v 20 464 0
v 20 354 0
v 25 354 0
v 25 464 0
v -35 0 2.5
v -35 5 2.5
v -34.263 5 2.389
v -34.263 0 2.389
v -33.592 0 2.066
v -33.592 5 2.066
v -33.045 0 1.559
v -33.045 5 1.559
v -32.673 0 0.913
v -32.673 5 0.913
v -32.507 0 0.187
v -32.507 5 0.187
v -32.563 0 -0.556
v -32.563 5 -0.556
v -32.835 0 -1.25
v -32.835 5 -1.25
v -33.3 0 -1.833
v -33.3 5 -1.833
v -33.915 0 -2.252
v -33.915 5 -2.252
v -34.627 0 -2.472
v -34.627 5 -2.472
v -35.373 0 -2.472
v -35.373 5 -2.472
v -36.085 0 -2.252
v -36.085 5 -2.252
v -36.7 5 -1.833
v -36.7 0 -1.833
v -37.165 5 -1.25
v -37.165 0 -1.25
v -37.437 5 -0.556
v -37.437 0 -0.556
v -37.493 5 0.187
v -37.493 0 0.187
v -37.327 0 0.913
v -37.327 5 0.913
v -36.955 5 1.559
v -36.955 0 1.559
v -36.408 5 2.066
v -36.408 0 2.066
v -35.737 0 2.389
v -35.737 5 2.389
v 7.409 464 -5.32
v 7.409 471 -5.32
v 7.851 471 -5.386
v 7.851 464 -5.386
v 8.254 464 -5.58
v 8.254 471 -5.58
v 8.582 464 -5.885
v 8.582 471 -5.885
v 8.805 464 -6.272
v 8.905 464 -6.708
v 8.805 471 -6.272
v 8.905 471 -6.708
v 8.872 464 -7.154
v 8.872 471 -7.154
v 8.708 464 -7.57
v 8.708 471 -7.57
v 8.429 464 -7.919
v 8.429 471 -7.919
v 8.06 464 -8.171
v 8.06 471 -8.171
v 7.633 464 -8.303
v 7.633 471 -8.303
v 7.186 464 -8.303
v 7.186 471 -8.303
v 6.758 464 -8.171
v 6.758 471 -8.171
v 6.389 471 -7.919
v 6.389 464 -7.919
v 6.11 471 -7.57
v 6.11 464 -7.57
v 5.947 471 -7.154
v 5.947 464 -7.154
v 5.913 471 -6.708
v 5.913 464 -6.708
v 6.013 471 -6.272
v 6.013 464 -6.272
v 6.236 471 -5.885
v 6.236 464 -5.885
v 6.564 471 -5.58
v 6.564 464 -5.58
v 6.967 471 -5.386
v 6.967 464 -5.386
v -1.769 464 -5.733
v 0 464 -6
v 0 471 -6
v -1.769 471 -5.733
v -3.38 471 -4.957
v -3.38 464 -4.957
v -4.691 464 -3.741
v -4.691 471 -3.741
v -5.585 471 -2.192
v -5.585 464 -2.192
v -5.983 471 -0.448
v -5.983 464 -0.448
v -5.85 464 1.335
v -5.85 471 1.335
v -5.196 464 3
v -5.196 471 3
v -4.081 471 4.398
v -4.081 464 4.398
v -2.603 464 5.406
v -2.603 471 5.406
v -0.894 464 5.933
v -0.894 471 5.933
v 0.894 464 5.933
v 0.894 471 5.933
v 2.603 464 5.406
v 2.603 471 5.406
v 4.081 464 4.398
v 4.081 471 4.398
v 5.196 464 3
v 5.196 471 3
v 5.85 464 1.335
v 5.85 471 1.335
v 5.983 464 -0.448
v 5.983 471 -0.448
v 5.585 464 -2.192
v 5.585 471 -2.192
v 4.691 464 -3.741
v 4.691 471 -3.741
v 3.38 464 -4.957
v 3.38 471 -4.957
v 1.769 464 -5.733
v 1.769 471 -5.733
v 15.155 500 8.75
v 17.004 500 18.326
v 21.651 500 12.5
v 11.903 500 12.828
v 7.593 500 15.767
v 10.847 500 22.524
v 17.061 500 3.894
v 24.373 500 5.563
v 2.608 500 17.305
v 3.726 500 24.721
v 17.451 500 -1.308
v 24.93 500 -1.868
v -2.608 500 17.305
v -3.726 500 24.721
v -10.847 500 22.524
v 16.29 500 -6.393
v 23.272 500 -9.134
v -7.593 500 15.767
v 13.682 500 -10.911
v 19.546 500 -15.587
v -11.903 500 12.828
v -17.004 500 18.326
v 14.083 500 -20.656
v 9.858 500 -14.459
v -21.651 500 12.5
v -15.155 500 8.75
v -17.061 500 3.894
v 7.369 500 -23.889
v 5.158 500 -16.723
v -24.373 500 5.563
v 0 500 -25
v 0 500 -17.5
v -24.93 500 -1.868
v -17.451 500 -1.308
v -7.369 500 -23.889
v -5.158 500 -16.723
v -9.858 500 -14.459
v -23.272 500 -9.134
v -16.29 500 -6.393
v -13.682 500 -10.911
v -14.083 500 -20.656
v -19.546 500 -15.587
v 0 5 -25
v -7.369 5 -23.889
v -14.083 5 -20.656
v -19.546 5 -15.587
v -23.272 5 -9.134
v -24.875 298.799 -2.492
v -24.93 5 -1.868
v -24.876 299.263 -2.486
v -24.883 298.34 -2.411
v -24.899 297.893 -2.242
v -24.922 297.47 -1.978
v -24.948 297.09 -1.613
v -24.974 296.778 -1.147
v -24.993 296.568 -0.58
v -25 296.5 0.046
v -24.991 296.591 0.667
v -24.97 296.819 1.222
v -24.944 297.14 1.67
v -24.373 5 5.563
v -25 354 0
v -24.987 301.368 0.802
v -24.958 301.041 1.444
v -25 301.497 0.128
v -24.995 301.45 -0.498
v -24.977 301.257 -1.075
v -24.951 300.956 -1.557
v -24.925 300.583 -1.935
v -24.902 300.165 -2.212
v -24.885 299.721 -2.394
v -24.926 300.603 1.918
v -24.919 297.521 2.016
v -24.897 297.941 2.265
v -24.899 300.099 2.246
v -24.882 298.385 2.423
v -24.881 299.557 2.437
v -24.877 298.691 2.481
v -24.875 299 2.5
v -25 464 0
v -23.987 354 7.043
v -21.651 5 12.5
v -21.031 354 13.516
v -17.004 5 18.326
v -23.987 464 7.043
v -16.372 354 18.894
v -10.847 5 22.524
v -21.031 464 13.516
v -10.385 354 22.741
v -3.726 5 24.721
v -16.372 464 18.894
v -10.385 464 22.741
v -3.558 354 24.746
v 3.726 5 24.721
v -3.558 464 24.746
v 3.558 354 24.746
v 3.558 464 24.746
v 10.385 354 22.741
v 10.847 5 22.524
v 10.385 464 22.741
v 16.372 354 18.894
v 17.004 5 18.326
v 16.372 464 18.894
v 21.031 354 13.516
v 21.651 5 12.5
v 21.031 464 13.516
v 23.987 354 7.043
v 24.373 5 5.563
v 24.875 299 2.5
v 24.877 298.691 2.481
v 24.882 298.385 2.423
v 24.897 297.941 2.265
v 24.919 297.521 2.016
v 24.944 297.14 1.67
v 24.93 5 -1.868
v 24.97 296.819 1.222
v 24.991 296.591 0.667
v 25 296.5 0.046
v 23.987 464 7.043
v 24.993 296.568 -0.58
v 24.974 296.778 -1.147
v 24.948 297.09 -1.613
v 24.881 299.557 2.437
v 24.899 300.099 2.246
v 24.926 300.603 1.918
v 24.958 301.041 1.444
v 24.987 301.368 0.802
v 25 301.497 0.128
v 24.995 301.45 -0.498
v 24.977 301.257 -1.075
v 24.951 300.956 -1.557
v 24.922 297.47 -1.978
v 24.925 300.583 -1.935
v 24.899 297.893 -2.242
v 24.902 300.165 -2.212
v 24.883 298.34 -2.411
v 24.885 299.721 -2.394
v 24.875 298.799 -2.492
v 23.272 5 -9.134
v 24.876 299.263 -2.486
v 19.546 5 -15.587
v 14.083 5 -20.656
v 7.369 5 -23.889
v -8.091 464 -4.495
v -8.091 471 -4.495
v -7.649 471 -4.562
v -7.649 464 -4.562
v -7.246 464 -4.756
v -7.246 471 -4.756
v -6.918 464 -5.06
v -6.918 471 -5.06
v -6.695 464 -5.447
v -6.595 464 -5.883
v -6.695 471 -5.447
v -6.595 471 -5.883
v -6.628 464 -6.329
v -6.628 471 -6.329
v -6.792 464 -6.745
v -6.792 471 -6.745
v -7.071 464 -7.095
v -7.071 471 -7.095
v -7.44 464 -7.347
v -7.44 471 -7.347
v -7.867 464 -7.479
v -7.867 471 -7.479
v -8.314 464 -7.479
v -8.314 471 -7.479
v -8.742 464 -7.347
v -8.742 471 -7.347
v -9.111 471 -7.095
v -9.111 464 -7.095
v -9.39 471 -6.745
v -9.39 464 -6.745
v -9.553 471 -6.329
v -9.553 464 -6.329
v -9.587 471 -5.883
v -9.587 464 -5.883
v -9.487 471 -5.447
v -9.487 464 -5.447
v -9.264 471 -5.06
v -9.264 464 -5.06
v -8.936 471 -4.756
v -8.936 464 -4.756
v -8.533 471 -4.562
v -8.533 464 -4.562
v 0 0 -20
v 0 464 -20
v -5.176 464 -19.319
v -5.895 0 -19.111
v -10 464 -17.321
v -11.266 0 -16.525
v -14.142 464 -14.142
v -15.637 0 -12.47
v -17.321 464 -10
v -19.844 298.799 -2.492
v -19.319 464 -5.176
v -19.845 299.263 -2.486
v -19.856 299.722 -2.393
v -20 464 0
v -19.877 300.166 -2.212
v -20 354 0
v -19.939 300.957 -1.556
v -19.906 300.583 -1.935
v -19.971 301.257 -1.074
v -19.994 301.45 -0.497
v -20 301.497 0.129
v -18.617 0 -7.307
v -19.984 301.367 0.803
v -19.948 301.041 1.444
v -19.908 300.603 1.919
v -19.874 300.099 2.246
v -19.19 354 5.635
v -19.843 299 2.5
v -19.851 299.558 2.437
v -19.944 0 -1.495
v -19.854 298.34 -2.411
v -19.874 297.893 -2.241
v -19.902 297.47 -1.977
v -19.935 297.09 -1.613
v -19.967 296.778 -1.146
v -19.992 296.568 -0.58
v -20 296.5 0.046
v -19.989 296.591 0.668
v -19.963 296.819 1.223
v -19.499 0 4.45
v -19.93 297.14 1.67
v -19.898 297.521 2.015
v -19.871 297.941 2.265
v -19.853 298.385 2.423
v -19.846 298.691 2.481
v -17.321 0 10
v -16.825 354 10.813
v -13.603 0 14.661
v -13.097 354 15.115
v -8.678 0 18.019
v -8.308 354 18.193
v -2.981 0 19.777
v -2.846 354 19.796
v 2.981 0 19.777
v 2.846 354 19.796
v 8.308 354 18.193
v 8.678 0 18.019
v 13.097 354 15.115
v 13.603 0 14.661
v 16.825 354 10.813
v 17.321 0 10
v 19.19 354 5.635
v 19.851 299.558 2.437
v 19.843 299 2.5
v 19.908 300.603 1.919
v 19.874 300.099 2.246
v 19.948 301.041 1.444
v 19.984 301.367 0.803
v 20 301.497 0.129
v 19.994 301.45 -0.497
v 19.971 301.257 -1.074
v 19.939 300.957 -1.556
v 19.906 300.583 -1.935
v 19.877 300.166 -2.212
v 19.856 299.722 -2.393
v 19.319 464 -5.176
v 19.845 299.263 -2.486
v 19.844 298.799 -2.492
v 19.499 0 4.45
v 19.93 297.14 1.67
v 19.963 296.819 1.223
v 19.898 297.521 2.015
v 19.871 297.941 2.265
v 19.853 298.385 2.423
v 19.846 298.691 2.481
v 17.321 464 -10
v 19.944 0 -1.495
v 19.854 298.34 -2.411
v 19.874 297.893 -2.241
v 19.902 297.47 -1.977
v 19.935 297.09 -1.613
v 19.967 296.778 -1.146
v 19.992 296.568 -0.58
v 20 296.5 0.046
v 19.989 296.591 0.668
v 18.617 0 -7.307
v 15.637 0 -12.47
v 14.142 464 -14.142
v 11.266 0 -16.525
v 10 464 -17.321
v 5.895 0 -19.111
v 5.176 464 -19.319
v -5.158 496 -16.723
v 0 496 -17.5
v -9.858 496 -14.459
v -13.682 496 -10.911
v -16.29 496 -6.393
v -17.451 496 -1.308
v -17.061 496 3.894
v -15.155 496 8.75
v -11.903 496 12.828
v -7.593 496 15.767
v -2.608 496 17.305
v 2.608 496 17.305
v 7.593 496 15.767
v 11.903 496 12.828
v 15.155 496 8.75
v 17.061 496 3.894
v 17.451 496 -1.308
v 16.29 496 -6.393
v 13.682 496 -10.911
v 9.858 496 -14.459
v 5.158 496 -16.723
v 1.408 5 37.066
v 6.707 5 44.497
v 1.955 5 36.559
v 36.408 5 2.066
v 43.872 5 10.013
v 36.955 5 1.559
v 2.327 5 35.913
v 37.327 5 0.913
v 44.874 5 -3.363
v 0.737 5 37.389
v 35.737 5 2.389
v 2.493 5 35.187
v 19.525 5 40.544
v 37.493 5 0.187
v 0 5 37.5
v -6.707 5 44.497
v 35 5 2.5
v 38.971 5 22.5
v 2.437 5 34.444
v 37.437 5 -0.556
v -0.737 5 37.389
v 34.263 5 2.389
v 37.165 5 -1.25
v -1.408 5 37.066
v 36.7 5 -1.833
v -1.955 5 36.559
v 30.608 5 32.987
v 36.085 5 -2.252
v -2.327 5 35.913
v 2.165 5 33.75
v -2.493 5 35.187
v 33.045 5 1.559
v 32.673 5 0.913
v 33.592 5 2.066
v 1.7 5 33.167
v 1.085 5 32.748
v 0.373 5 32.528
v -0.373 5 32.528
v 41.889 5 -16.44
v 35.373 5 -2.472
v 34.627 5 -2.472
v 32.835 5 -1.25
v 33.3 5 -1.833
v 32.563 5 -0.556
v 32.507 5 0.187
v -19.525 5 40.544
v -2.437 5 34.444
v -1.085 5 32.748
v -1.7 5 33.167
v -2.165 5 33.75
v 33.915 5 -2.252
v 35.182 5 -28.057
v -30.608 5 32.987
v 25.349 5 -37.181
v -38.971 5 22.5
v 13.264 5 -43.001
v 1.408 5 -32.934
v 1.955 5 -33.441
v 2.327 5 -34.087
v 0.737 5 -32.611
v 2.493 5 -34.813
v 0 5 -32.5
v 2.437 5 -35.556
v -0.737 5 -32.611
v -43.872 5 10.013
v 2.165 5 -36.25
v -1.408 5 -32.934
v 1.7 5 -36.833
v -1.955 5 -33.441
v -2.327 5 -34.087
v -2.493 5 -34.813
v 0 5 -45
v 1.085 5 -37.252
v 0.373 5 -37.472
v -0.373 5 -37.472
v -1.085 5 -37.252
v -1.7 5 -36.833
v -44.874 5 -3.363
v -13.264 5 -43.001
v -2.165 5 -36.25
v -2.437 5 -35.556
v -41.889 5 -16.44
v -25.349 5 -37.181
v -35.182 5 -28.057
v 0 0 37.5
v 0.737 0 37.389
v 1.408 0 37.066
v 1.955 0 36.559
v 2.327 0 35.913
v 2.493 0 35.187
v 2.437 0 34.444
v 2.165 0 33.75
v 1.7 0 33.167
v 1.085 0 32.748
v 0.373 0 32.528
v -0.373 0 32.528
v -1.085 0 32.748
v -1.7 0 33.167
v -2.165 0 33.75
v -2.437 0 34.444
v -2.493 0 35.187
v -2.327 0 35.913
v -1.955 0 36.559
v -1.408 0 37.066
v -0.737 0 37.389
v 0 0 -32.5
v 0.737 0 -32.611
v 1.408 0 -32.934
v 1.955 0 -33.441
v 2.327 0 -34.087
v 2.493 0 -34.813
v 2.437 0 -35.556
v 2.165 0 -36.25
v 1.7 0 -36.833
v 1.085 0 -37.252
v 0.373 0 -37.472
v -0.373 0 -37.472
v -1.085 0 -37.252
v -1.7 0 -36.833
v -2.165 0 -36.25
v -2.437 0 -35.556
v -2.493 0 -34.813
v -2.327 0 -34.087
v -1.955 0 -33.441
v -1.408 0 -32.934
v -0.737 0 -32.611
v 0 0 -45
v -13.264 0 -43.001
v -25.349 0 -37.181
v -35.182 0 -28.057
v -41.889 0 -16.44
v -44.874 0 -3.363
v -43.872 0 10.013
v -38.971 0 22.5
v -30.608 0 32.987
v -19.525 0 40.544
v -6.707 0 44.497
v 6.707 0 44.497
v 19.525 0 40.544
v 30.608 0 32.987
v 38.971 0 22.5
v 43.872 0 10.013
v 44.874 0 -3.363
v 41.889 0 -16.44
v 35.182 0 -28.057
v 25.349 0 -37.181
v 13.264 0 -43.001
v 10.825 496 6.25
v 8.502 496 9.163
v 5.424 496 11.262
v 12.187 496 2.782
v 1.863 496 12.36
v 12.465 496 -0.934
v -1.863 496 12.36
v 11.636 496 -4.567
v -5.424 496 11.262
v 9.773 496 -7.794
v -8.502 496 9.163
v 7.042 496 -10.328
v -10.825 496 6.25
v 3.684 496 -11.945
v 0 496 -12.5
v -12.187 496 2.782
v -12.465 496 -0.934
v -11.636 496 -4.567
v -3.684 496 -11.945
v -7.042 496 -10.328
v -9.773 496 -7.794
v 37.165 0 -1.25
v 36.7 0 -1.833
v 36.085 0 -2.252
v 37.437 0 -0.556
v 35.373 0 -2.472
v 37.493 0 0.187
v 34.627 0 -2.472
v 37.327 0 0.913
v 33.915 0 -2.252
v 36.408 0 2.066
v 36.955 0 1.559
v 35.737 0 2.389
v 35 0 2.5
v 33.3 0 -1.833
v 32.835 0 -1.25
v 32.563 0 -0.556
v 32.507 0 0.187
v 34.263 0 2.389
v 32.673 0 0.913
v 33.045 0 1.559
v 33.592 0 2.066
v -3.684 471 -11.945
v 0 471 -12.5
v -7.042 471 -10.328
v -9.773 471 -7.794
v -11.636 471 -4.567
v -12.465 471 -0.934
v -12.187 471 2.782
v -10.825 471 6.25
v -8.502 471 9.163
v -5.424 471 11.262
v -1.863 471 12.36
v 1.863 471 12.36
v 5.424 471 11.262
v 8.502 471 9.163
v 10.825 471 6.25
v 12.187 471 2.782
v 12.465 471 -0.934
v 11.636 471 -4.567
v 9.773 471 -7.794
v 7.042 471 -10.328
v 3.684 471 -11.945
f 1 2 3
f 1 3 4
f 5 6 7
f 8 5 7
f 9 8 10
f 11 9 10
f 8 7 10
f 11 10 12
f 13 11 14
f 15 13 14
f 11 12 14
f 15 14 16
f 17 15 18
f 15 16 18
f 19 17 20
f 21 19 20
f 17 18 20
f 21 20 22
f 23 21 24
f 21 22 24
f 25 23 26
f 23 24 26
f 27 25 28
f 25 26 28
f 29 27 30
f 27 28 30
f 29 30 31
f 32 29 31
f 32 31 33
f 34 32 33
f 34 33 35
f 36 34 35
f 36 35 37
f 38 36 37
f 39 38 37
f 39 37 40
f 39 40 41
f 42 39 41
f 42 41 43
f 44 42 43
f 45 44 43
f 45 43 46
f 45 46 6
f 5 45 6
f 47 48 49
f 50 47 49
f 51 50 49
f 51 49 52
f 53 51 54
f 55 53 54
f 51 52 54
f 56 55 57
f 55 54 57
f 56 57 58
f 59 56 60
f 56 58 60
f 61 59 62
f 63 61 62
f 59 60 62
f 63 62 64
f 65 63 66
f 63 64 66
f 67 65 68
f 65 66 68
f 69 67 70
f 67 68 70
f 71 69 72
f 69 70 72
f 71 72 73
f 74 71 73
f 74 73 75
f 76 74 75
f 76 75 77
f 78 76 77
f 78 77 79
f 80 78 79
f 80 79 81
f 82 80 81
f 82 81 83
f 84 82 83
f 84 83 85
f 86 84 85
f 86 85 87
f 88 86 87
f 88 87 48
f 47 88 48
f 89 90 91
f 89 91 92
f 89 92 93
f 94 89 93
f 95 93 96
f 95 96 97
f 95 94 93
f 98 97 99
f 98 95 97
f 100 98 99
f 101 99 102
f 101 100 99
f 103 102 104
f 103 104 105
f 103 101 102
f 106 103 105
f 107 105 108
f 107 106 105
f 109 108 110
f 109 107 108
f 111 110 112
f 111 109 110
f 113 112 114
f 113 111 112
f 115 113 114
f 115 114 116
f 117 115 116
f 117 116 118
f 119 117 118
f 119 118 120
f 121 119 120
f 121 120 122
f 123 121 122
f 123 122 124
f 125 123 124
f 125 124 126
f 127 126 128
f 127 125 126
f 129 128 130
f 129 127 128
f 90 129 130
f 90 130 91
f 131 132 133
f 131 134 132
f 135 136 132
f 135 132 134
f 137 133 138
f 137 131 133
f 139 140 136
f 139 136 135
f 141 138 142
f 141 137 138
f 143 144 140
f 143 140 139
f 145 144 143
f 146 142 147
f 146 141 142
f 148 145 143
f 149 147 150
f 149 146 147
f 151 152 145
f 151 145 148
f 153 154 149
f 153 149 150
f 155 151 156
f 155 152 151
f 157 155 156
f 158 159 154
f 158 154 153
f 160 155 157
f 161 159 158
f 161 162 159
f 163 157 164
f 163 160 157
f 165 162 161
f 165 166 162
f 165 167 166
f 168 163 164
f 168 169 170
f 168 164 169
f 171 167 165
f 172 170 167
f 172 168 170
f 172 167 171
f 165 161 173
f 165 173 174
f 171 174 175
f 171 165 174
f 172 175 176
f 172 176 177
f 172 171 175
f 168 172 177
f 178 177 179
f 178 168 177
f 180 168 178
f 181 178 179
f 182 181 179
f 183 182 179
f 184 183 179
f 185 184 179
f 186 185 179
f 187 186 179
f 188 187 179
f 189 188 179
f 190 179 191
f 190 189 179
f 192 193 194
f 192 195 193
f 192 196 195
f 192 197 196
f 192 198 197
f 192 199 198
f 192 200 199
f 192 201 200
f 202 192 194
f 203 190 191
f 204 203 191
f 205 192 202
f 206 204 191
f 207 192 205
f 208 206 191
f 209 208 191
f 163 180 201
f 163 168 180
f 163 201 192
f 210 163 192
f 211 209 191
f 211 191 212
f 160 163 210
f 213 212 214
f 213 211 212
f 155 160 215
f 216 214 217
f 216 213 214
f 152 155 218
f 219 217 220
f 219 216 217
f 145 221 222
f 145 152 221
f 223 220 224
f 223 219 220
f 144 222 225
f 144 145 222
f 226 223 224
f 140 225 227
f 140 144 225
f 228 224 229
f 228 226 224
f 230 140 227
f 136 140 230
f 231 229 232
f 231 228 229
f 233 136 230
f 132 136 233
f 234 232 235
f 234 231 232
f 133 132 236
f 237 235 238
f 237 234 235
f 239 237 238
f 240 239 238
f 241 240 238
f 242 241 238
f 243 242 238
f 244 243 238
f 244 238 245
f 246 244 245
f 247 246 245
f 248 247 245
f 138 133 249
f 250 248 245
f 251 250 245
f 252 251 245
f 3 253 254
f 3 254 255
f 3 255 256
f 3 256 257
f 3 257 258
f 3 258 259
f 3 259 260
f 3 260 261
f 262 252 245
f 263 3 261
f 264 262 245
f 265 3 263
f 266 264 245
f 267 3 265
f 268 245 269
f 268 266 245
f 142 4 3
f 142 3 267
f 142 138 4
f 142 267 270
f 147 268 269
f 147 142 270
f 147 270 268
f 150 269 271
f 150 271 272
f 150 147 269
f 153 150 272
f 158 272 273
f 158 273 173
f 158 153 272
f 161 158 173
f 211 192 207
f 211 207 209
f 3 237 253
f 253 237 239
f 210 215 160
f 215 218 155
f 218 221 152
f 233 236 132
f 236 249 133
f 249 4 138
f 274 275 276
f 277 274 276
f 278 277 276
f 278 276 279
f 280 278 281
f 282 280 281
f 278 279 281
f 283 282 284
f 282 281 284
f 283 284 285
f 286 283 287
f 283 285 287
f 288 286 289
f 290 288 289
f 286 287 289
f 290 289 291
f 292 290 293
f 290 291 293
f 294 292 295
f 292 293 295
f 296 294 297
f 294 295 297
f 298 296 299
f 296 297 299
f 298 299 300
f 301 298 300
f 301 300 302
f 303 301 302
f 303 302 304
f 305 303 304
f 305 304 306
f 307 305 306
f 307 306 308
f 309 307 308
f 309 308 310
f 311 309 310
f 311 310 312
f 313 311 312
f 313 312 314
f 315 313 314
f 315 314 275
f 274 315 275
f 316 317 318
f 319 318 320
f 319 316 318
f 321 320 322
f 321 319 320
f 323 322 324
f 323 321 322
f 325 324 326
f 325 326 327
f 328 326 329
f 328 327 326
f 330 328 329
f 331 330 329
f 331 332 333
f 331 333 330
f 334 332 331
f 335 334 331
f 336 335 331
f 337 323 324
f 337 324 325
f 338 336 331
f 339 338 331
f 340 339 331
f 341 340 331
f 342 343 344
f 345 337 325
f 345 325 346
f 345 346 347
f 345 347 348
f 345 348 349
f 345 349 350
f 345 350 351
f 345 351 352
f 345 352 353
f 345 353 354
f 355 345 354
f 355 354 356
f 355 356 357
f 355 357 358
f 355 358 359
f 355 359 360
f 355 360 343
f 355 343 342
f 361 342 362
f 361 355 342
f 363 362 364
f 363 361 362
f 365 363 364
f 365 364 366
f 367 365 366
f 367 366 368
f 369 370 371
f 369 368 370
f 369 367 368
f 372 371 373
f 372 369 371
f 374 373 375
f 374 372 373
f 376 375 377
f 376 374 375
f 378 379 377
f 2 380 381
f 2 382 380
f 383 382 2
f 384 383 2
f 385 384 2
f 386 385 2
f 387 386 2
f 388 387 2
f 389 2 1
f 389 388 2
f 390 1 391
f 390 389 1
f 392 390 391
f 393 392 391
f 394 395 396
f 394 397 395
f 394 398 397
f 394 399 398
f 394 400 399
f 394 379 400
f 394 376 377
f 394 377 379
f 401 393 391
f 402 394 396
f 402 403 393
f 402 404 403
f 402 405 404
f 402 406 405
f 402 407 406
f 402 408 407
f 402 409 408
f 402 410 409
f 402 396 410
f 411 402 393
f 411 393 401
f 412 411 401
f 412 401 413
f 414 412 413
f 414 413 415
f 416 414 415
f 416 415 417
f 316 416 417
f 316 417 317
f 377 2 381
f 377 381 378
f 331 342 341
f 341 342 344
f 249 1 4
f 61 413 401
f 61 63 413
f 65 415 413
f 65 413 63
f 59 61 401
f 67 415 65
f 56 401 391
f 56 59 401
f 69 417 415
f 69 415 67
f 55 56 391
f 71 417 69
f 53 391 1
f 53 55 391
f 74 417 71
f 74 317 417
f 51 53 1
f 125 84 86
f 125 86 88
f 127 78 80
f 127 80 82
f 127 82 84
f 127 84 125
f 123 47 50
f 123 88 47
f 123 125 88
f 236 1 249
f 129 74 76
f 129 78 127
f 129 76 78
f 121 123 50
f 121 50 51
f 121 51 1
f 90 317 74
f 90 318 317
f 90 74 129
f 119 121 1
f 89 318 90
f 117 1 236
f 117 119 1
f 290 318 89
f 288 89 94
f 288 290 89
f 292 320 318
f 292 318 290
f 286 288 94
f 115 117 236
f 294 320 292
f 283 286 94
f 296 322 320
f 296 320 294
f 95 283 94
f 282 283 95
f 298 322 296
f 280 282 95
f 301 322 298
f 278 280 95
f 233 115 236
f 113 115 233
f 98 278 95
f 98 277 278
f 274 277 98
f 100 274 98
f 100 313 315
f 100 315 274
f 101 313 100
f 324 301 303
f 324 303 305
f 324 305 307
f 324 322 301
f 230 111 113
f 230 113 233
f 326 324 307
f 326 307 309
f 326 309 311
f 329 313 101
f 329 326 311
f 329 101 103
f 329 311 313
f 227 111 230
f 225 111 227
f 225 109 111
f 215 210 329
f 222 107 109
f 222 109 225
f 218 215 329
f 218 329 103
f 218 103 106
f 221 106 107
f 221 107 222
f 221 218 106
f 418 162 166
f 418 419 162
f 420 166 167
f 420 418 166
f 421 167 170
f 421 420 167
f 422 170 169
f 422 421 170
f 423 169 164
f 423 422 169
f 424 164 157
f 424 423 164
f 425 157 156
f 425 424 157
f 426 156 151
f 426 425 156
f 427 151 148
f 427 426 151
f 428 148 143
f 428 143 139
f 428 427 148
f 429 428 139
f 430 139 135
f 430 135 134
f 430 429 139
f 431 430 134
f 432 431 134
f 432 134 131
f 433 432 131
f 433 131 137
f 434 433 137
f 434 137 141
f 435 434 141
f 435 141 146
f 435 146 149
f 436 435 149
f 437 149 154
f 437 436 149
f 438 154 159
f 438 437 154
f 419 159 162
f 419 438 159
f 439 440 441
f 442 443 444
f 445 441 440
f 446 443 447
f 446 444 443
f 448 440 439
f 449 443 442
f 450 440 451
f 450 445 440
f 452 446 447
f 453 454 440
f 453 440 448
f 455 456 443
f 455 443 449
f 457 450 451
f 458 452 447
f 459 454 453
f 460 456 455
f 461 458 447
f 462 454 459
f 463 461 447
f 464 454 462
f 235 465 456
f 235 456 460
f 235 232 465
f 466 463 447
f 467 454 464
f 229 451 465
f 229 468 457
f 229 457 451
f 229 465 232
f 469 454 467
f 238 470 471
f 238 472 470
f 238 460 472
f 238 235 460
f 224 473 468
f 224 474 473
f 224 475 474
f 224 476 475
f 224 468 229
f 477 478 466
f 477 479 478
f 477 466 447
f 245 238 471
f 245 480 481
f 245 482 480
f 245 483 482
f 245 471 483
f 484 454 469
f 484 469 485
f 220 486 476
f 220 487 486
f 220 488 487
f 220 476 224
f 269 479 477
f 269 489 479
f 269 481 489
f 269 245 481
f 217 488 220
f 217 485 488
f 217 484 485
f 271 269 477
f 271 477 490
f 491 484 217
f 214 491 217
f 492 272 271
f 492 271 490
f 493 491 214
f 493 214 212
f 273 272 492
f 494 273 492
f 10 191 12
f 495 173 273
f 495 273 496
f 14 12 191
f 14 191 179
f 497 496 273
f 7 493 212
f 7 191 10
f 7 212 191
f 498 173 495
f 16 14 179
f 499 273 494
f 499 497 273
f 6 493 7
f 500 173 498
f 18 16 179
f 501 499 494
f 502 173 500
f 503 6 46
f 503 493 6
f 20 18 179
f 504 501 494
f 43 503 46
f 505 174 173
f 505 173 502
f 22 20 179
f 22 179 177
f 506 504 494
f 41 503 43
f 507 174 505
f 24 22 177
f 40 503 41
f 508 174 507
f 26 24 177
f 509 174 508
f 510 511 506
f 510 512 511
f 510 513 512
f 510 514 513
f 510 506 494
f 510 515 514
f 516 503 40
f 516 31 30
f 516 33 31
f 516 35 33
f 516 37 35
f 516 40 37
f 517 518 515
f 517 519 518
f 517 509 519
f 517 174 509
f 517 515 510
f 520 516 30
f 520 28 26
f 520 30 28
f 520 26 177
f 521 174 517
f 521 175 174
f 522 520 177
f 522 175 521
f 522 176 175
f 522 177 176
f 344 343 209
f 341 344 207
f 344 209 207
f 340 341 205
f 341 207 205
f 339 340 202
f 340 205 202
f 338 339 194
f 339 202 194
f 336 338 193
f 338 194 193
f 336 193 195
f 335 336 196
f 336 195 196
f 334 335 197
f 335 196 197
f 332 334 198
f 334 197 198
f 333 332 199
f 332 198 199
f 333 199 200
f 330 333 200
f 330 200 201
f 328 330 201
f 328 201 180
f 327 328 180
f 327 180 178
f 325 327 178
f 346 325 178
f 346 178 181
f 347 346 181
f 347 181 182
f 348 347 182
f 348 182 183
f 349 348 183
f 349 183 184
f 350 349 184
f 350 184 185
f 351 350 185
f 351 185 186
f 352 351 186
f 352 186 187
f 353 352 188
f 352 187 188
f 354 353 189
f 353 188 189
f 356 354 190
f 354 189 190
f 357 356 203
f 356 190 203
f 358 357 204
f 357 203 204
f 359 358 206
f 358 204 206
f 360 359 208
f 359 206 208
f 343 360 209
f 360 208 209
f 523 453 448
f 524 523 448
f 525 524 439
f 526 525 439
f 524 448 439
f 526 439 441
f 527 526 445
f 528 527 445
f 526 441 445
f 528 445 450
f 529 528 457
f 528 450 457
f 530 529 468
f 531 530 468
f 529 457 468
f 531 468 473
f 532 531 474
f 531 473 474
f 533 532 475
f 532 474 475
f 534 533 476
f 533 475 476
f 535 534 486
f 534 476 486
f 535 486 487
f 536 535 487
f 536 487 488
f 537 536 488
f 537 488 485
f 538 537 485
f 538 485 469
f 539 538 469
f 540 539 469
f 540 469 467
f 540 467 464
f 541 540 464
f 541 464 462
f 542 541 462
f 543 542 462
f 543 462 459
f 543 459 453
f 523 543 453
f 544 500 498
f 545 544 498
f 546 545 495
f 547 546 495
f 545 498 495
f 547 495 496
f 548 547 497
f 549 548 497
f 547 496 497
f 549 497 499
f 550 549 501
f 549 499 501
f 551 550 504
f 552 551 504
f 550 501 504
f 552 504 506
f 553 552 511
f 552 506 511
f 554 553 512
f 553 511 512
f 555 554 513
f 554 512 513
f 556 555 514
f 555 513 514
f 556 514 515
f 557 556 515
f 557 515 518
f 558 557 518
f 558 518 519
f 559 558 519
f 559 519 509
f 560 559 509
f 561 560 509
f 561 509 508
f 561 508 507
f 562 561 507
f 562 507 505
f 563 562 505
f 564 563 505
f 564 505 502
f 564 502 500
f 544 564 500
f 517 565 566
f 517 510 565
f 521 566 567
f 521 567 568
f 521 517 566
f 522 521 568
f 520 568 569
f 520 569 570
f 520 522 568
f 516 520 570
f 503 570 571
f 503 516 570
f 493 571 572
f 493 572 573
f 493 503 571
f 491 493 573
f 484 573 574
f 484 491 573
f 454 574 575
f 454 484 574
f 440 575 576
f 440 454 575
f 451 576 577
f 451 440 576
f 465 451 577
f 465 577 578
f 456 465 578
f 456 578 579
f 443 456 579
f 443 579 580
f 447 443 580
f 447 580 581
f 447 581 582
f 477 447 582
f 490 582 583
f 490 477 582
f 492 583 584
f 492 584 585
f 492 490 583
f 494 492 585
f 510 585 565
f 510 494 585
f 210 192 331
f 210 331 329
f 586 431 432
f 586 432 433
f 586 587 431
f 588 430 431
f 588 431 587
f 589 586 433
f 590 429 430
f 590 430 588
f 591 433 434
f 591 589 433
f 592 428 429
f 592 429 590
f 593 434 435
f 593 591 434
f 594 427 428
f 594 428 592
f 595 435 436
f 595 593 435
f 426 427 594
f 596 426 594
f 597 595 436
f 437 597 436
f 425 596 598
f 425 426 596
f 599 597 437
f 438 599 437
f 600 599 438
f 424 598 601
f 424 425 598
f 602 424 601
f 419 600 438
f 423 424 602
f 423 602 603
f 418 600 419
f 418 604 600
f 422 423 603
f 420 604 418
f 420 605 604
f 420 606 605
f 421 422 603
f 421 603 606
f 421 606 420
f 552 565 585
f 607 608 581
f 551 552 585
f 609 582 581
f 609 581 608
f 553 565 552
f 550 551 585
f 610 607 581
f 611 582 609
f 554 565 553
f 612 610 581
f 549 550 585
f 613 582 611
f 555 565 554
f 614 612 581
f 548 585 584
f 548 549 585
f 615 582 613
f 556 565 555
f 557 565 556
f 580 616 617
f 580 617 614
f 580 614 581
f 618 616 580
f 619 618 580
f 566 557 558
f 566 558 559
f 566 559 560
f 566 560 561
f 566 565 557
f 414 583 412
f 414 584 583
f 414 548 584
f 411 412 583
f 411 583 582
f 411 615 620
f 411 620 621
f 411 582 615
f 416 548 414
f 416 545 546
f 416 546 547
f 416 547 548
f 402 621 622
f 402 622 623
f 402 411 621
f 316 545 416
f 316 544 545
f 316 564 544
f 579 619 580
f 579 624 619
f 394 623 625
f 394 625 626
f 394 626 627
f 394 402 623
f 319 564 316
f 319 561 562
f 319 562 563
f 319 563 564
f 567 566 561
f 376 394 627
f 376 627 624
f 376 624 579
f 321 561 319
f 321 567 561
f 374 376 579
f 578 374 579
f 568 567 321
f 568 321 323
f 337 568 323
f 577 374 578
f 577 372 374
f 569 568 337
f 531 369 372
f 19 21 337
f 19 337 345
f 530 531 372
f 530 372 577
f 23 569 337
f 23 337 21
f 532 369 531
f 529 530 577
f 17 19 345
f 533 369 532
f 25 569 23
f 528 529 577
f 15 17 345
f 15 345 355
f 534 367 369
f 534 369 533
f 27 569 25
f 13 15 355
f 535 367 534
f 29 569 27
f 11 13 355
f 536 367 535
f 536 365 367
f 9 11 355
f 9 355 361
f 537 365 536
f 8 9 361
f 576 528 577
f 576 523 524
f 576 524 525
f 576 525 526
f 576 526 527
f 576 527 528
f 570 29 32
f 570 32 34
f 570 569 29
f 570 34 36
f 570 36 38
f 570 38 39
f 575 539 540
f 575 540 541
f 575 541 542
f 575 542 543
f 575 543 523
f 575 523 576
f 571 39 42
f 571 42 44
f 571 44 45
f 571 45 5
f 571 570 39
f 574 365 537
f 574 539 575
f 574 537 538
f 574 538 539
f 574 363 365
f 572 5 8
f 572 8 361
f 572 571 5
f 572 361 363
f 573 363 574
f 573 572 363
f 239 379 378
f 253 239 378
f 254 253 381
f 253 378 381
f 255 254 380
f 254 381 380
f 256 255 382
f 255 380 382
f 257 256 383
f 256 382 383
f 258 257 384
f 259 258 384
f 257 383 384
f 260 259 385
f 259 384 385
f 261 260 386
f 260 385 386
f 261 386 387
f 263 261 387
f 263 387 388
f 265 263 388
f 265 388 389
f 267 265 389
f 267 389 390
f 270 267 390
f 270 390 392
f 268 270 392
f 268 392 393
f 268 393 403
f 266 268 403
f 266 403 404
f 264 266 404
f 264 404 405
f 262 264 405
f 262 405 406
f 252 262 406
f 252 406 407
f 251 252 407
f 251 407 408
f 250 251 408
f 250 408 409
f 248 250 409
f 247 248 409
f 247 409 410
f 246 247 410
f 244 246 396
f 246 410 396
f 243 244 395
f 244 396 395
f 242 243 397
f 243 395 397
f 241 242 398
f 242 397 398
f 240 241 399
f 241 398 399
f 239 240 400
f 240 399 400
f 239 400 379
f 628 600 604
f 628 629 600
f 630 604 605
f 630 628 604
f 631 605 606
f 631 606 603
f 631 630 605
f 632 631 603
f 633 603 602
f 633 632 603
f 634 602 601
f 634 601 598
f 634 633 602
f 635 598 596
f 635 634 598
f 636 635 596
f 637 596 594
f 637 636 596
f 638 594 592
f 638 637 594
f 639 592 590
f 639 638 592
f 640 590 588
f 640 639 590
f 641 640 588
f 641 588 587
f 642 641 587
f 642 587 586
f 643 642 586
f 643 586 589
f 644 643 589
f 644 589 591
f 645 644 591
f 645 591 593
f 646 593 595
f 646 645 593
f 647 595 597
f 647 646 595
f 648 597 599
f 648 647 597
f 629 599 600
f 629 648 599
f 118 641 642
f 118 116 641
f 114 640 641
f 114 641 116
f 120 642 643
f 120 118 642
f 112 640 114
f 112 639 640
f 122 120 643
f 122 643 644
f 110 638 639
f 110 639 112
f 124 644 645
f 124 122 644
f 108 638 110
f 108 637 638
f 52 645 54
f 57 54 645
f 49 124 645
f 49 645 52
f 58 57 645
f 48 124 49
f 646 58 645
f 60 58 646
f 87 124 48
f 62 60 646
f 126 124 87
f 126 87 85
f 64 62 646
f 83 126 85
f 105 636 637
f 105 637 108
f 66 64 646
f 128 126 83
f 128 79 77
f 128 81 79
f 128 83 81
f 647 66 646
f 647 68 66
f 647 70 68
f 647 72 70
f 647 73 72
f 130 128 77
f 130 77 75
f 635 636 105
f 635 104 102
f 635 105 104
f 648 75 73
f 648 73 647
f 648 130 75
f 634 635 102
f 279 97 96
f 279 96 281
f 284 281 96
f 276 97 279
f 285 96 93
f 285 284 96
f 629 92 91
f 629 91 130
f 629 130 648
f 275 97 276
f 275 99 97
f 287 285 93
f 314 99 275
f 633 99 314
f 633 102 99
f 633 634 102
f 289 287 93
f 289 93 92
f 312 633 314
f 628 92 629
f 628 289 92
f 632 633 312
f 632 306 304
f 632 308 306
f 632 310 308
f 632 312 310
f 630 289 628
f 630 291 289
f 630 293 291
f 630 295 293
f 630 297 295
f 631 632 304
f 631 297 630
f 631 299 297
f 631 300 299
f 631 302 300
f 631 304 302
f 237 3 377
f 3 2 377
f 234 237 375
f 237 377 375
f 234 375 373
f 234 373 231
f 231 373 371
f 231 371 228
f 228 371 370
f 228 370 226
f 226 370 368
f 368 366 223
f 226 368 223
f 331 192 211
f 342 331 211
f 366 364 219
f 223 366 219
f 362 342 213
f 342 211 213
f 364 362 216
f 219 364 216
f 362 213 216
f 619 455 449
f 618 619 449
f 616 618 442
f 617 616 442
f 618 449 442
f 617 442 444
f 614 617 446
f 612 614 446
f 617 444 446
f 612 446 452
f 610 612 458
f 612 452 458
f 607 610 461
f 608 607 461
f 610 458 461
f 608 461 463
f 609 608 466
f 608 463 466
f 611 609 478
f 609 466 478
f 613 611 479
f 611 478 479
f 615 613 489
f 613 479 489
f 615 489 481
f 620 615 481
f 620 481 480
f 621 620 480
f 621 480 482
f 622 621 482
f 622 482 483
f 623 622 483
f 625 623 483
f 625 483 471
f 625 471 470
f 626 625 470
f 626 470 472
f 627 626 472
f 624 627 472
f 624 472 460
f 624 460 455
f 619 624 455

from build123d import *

# Parameters (mm, degrees)
SKETCH2_R          = 2.5
SKETCH2_W          = 30
SKETCH2_H          = 110
CUT_EXTRUDE1_DEPTH = 507.87769728
SKETCH3_R          = 1.5
CUT_EXTRUDE2_DEPTH = 476.279917621
CUT_EXTRUDE3_REACH = 501.074
SKETCH4_R          = 2.5


with BuildPart() as part:
    # Sketch1 → Revolve1 (revolve)
    with BuildSketch(Plane.XY, mode=Mode.PRIVATE) as revolve1_sk:
        Polygon((20, 0), (45, 0), (45, 5), (25, 5), (25, 500), (17.5, 500), (17.5, 496), (12.5, 496), (12.5, 471), (6, 471), (6, 464), (20, 464), align=None)
    revolve(revolve1_sk.sketch.rotate(Axis((0, 0, 0), (0, 1, 0)), 90), axis=Axis((0, 0, 0), (0, 1, 0)))

    # Sketch2 → Cut-Extrude1 (cut, through all)
    with BuildSketch(Plane.ZY.offset(25)):
        with Locations((0, 299)):
            Circle(SKETCH2_R)
        with Locations((15, 409)):
            Rectangle(SKETCH2_W, SKETCH2_H)
    extrude(amount=-CUT_EXTRUDE1_DEPTH, mode=Mode.SUBTRACT)

    # Sketch3 → Cut-Extrude2 (cut, through all)
    with BuildSketch(Plane(origin=(0, 471, 0), x_dir=(1, 0, 0), z_dir=(0, 1, 0))):
        with Locations(Location((-8.090824797, 5.99528599, 0), (0, 0, 270))):
            Circle(SKETCH3_R)
        with Locations(Location((7.409175203, 6.819752401, 0), (0, 0, 270))):
            Circle(SKETCH3_R)
    extrude(amount=-CUT_EXTRUDE2_DEPTH, mode=Mode.SUBTRACT)

    # Sketch4 → Cut-Extrude3 (cut, up to next)
    with BuildSketch(Plane(origin=(0, 5, 0), x_dir=(1, 0, 0), z_dir=(0, 1, 0)), mode=Mode.PRIVATE) as cut_extrude3_sk1:
        with Locations(Location((0, 35, 0), (0, 0, 270))):
            Circle(SKETCH4_R)
    cut_extrude3_tool1 = extrude(cut_extrude3_sk1.sketch, amount=-CUT_EXTRUDE3_REACH, mode=Mode.PRIVATE) & part.part
    # Sketch4 → Cut-Extrude3 (cut, up to next)
    with BuildSketch(Plane(origin=(0, 5, 0), x_dir=(1, 0, 0), z_dir=(0, 1, 0)), mode=Mode.PRIVATE) as cut_extrude3_sk2:
        with Locations(Location((35, 0, 0), (0, 0, 270))):
            Circle(SKETCH4_R)
    cut_extrude3_tool2 = extrude(cut_extrude3_sk2.sketch, amount=-CUT_EXTRUDE3_REACH, mode=Mode.PRIVATE) & part.part
    # Sketch4 → Cut-Extrude3 (cut, up to next)
    with BuildSketch(Plane(origin=(0, 5, 0), x_dir=(1, 0, 0), z_dir=(0, 1, 0)), mode=Mode.PRIVATE) as cut_extrude3_sk3:
        with Locations(Location((0, -35, 0), (0, 0, 270))):
            Circle(SKETCH4_R)
    cut_extrude3_tool3 = extrude(cut_extrude3_sk3.sketch, amount=-CUT_EXTRUDE3_REACH, mode=Mode.PRIVATE) & part.part
    # Sketch4 → Cut-Extrude3 (cut, up to next)
    with BuildSketch(Plane(origin=(0, 5, 0), x_dir=(1, 0, 0), z_dir=(0, 1, 0)), mode=Mode.PRIVATE) as cut_extrude3_sk4:
        with Locations(Location((-35, 0, 0), (0, 0, 270))):
            Circle(SKETCH4_R)
    cut_extrude3_tool4 = extrude(cut_extrude3_sk4.sketch, amount=-CUT_EXTRUDE3_REACH, mode=Mode.PRIVATE) & part.part
    add(cut_extrude3_tool1.solids().sort_by_distance((0, 5, -35))[0], mode=Mode.SUBTRACT)
    add(cut_extrude3_tool2.solids().sort_by_distance((35, 5, 0))[0], mode=Mode.SUBTRACT)
    add(cut_extrude3_tool3.solids().sort_by_distance((0, 5, 35))[0], mode=Mode.SUBTRACT)
    add(cut_extrude3_tool4.solids().sort_by_distance((-35, 5, 0))[0], mode=Mode.SUBTRACT)


solid = part.part
